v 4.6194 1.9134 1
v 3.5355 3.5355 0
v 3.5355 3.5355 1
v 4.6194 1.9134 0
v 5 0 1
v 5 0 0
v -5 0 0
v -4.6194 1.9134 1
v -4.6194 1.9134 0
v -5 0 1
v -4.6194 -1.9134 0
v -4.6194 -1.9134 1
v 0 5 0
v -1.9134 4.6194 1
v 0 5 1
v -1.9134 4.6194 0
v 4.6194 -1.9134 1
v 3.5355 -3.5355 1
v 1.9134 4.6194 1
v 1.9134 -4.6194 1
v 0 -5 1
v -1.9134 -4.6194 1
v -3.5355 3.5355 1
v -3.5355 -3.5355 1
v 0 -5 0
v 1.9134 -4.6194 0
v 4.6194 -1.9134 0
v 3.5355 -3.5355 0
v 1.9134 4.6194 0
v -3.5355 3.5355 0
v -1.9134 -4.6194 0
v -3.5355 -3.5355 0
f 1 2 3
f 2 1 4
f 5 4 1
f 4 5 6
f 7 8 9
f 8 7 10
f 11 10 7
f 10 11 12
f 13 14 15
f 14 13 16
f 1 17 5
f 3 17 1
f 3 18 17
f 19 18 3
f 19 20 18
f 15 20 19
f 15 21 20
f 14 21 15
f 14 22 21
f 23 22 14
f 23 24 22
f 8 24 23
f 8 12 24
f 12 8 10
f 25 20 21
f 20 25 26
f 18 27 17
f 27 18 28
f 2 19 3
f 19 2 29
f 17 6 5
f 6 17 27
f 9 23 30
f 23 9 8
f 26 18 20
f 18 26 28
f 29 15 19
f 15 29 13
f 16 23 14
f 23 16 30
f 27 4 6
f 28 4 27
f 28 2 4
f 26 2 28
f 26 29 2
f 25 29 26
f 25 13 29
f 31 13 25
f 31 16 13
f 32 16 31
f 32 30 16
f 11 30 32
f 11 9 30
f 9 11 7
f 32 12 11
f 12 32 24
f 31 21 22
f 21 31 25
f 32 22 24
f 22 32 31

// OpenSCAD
difference() {
  union() {
    minkowski() {
      cylinder(r=5, h=1);
      linear_extrude(height = 2)
        import (file = "cutter.dxf", layer = "cutter");
    }
    minkowski() {
      cylinder(r=1, h=1);
      linear_extrude(height = 10)
        import (file = "cutter.dxf", layer = "cutter");
    }
  }

  translate([0,0,-0.5]) {
    linear_extrude(height = 12)
      import (file = "cutter.dxf", layer = "cutter");
   }
}
